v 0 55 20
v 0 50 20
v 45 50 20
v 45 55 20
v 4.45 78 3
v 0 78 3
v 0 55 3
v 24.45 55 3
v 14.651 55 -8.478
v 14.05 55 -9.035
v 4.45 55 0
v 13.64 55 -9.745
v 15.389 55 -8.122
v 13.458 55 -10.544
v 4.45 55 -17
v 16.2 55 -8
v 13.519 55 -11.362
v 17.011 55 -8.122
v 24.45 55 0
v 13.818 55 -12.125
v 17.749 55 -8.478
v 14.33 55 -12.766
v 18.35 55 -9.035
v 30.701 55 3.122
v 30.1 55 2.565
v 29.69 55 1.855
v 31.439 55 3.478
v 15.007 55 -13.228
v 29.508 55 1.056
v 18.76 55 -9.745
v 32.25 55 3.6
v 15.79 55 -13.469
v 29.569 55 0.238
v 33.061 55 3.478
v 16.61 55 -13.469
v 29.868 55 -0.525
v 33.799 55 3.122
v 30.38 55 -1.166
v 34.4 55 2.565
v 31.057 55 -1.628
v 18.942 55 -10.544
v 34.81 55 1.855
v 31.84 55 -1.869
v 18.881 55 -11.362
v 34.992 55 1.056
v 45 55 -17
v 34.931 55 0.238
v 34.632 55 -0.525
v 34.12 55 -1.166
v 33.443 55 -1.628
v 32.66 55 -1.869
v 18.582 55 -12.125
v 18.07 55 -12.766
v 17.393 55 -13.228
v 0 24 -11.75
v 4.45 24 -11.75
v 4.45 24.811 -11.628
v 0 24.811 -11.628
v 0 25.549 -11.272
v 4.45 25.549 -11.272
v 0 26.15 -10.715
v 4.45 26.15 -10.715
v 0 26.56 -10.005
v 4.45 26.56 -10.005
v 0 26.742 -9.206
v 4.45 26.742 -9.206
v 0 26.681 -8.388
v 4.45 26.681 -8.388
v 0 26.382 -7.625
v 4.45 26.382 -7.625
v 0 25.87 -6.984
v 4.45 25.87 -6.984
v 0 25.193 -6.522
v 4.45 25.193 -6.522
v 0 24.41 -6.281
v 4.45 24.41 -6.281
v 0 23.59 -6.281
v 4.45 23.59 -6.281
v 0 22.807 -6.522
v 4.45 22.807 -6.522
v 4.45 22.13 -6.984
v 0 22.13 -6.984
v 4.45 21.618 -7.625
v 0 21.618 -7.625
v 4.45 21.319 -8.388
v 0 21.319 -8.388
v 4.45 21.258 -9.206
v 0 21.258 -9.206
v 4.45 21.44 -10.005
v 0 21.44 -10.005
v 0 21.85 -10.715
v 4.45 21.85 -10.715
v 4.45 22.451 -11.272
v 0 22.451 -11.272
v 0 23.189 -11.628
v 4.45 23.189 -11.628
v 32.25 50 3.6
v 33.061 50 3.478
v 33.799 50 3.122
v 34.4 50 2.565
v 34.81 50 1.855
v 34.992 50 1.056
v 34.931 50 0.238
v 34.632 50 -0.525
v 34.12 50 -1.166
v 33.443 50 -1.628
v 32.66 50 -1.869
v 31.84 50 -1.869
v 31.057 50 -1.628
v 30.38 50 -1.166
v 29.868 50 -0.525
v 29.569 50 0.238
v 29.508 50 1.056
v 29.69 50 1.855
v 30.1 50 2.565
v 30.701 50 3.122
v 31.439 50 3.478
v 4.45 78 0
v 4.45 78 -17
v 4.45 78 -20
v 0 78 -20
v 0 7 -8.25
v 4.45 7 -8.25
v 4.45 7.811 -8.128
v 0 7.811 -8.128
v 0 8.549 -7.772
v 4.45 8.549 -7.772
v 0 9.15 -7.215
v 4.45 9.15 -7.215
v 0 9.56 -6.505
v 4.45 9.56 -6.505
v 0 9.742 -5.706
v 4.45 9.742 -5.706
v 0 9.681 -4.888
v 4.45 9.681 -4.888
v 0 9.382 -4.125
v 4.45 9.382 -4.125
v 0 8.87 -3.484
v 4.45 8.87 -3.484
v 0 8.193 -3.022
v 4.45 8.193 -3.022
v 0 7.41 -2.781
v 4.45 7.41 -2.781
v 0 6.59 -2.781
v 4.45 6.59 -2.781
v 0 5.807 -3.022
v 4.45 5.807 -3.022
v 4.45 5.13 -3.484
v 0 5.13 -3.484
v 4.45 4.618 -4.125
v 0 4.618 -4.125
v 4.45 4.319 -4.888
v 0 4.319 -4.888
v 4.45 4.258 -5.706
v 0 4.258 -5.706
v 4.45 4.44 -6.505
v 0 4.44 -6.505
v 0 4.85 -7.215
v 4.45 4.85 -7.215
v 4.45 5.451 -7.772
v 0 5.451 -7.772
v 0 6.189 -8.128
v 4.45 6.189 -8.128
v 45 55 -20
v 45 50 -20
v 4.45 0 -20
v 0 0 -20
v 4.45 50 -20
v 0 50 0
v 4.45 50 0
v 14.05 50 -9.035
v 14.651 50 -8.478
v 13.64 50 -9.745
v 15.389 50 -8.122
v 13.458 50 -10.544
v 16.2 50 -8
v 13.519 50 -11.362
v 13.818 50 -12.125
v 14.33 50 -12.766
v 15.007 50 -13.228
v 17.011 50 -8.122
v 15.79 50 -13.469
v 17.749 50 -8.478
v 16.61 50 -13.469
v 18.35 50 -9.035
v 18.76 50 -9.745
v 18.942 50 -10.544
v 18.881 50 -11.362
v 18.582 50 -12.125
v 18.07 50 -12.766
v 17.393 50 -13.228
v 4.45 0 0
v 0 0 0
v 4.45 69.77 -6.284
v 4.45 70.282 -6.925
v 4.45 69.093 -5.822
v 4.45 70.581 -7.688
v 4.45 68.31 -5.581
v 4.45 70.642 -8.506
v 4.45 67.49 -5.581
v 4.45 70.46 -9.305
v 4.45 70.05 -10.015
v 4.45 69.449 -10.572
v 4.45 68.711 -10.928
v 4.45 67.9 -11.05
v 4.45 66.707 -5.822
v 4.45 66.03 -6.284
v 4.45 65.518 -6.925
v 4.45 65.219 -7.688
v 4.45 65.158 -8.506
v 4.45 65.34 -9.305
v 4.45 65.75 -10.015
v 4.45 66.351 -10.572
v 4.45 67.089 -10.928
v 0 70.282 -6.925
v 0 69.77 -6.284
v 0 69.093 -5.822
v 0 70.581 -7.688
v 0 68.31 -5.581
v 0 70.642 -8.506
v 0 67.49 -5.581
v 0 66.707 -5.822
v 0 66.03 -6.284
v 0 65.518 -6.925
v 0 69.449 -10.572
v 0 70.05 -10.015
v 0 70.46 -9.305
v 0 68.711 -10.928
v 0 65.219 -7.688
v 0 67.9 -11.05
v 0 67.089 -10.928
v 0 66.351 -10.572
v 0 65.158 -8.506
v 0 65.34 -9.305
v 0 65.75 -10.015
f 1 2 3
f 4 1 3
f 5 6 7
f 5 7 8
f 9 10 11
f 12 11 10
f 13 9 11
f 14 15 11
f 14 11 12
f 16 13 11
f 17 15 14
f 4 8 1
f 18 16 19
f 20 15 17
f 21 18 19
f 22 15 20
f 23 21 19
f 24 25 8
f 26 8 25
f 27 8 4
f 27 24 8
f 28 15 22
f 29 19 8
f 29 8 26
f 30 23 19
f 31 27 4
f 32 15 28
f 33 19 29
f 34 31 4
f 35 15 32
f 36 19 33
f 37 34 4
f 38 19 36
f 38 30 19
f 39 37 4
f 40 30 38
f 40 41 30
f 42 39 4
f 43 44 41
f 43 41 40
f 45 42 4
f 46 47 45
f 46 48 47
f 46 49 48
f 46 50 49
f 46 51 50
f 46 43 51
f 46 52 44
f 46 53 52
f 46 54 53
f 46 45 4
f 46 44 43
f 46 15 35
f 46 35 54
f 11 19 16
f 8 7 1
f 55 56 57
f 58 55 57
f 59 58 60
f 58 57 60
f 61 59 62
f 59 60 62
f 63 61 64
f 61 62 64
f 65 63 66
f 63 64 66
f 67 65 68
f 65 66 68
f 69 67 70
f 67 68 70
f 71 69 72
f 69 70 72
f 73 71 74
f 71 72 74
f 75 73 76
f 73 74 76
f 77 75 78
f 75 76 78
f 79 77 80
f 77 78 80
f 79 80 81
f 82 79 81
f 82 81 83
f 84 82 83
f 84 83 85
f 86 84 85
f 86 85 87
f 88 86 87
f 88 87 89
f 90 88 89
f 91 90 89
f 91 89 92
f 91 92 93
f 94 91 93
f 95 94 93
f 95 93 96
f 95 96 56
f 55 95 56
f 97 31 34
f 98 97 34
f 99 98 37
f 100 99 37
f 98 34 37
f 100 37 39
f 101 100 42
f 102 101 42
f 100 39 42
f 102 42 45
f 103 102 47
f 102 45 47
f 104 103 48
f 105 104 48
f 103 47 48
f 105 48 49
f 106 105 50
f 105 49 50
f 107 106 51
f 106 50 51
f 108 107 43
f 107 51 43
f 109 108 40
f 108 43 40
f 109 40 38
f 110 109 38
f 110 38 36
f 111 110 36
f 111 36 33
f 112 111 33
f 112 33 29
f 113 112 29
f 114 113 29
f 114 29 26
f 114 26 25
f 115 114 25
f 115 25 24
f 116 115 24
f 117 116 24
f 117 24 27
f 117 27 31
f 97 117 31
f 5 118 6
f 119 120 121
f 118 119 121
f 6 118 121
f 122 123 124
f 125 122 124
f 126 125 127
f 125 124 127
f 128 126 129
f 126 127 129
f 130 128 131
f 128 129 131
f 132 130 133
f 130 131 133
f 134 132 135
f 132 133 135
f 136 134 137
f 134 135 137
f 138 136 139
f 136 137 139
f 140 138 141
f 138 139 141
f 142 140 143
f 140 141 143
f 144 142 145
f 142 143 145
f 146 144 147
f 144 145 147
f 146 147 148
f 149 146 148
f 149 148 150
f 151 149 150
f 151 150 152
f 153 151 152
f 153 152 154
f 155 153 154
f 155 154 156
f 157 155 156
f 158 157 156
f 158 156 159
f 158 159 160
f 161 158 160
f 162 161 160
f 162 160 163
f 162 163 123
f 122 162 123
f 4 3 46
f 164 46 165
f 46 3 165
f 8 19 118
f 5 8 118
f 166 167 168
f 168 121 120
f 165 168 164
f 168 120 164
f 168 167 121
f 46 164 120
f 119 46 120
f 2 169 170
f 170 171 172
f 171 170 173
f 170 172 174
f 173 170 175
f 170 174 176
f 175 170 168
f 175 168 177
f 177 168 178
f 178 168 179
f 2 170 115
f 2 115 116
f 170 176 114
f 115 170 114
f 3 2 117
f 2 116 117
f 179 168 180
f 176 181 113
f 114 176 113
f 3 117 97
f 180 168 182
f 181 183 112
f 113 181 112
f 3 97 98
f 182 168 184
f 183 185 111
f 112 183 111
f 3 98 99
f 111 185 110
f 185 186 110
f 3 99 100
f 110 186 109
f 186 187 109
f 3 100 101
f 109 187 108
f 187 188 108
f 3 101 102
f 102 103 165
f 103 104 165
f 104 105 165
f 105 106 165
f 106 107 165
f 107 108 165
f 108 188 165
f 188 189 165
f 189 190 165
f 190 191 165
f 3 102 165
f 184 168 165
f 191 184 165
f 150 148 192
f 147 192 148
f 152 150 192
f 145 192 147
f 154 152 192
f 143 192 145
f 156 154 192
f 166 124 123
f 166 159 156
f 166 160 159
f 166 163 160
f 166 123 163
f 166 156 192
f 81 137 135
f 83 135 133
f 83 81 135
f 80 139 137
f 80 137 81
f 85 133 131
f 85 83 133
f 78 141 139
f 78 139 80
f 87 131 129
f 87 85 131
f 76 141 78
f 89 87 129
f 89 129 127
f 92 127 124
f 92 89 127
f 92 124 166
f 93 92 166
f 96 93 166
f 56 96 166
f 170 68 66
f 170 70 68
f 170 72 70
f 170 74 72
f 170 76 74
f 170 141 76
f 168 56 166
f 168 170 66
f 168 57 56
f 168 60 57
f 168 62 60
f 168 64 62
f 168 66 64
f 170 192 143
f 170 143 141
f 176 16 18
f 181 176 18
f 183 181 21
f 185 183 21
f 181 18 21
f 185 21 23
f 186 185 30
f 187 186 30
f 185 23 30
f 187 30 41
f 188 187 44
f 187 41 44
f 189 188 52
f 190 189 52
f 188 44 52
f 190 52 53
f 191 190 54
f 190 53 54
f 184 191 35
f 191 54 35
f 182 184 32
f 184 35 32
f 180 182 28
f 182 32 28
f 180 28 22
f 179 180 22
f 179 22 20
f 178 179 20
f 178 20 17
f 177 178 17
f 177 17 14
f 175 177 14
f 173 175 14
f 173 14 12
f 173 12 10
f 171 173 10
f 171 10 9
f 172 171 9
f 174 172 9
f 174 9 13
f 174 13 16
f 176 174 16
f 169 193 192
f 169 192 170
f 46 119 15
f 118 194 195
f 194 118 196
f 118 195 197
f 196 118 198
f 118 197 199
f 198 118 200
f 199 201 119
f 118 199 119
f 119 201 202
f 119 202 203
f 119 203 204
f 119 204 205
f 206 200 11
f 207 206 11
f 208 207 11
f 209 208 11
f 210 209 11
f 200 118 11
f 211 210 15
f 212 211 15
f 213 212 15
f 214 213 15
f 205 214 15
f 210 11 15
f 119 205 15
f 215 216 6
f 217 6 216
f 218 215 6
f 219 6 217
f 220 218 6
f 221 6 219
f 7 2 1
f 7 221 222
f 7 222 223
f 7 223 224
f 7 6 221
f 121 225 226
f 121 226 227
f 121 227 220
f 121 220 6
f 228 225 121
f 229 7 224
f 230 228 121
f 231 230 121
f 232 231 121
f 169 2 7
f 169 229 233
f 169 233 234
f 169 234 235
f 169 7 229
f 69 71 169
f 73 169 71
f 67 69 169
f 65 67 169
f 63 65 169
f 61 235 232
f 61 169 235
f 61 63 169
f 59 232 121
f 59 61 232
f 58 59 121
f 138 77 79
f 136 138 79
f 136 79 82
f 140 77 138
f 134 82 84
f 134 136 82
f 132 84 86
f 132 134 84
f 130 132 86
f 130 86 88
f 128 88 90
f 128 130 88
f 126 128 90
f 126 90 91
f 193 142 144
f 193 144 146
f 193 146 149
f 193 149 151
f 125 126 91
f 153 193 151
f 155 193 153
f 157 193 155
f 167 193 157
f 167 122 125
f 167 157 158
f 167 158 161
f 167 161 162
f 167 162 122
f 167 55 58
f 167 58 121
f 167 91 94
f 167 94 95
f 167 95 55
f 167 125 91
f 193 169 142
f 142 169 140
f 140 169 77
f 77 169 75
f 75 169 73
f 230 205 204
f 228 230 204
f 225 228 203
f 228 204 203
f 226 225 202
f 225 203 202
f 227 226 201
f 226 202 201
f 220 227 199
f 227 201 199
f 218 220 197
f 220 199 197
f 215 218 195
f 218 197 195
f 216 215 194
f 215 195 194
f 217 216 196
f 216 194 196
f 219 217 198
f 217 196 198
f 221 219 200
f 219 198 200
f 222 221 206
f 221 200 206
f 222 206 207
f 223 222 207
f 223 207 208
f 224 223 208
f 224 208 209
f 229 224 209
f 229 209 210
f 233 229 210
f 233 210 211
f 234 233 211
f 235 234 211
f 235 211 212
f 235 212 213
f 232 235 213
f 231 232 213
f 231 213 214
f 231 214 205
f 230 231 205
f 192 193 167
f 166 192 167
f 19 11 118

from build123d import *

# Parameters (mm, degrees)
SKETCH1_W           = 20
SKETCH1_H           = 50
BOSS_EXTRUDE1_DEPTH = 4.45
SKETCH2_W           = 45
SKETCH2_H           = 40
BOSS_EXTRUDE2_DEPTH = 5
CUT_EXTRUDE1_REACH  = 75.824
SKETCH4_R           = 2.75
SKETCH5_R           = 2.75
CUT_EXTRUDE2_DEPTH  = 72.199034404
SKETCH6_W           = 4.45
SKETCH6_H           = 20
BOSS_EXTRUDE3_DEPTH = 23
SKETCH7_R           = 2.75
CUT_EXTRUDE3_DEPTH  = 91.157098999
BOSS_EXTRUDE4_DEPTH = 3
BOSS_EXTRUDE5_DEPTH = 3


with BuildPart() as part:
    # Sketch1 → Boss-Extrude1 (new body)
    with BuildSketch(Plane(origin=(0, 0, 0), x_dir=(0, 0, -1), z_dir=(1, 0, 0))):
        with Locations((10, 25)):
            Rectangle(SKETCH1_W, SKETCH1_H)
    extrude(amount=BOSS_EXTRUDE1_DEPTH)

    # Sketch2 → Boss-Extrude2 (add)
    with BuildSketch(Plane(origin=(0, 50, 0), x_dir=(1, 0, 0), z_dir=(0, 1, 0))):
        with Locations((22.5, 0)):
            Rectangle(SKETCH2_W, SKETCH2_H)
    extrude(amount=BOSS_EXTRUDE2_DEPTH)

    # Sketch4 → Cut-Extrude1 (cut, up to next)
    with BuildSketch(Plane(origin=(0, 55, 0), x_dir=(1, 0, 0), z_dir=(0, 1, 0)), mode=Mode.PRIVATE) as cut_extrude1_sk1:
        with Locations(Location((32.25, -0.85, 0), (0, 0, 270))):
            Circle(SKETCH4_R)
    cut_extrude1_tool1 = extrude(cut_extrude1_sk1.sketch, amount=-CUT_EXTRUDE1_REACH, mode=Mode.PRIVATE) & part.part
    # Sketch4 → Cut-Extrude1 (cut, up to next)
    with BuildSketch(Plane(origin=(0, 55, 0), x_dir=(1, 0, 0), z_dir=(0, 1, 0)), mode=Mode.PRIVATE) as cut_extrude1_sk2:
        with Locations(Location((16.2, 10.75, 0), (0, 0, 270))):
            Circle(SKETCH4_R)
    cut_extrude1_tool2 = extrude(cut_extrude1_sk2.sketch, amount=-CUT_EXTRUDE1_REACH, mode=Mode.PRIVATE) & part.part
    add(cut_extrude1_tool1.solids().sort_by_distance((32.25, 55, 0.85))[0], mode=Mode.SUBTRACT)
    add(cut_extrude1_tool2.solids().sort_by_distance((16.2, 55, -10.75))[0], mode=Mode.SUBTRACT)

    # Sketch5 → Cut-Extrude2 (cut, through all)
    with BuildSketch(Plane(origin=(4.45, 0, 0), x_dir=(0, 0, -1), z_dir=(1, 0, 0))):
        with Locations((9, 24)):
            Circle(SKETCH5_R)
        with Locations((5.5, 7)):
            Circle(SKETCH5_R)
    extrude(amount=-CUT_EXTRUDE2_DEPTH, mode=Mode.SUBTRACT)

    # Sketch6 → Boss-Extrude3 (add)
    with BuildSketch(Plane(origin=(0, 55, 0), x_dir=(1, 0, 0), z_dir=(0, 1, 0))):
        with Locations((2.225, 10)):
            Rectangle(SKETCH6_W, SKETCH6_H)
    extrude(amount=BOSS_EXTRUDE3_DEPTH)

    # Sketch7 → Cut-Extrude3 (cut, through all)
    with BuildSketch(Plane(origin=(4.45, 0, 0), x_dir=(0, 0, -1), z_dir=(1, 0, 0))):
        with Locations((8.3, 67.9)):
            Circle(SKETCH7_R)
    extrude(amount=-CUT_EXTRUDE3_DEPTH, mode=Mode.SUBTRACT)

    # Sketch8 → Boss-Extrude4 (add)
    with BuildSketch(Plane(origin=(0, 0, -20), x_dir=(-1, 0, 0), z_dir=(0, 0, -1))):
        Polygon((-4.45, 78), (-4.45, 55), (-45, 55), align=None)
    extrude(amount=-BOSS_EXTRUDE4_DEPTH)

    # Sketch9 → Boss-Extrude5 (add)
    with BuildSketch(Plane.XY):
        Polygon((4.45, 55), (24.45, 55), (4.45, 78), (0, 78), (0, 55), align=None)
    extrude(amount=BOSS_EXTRUDE5_DEPTH)


solid = part.part
